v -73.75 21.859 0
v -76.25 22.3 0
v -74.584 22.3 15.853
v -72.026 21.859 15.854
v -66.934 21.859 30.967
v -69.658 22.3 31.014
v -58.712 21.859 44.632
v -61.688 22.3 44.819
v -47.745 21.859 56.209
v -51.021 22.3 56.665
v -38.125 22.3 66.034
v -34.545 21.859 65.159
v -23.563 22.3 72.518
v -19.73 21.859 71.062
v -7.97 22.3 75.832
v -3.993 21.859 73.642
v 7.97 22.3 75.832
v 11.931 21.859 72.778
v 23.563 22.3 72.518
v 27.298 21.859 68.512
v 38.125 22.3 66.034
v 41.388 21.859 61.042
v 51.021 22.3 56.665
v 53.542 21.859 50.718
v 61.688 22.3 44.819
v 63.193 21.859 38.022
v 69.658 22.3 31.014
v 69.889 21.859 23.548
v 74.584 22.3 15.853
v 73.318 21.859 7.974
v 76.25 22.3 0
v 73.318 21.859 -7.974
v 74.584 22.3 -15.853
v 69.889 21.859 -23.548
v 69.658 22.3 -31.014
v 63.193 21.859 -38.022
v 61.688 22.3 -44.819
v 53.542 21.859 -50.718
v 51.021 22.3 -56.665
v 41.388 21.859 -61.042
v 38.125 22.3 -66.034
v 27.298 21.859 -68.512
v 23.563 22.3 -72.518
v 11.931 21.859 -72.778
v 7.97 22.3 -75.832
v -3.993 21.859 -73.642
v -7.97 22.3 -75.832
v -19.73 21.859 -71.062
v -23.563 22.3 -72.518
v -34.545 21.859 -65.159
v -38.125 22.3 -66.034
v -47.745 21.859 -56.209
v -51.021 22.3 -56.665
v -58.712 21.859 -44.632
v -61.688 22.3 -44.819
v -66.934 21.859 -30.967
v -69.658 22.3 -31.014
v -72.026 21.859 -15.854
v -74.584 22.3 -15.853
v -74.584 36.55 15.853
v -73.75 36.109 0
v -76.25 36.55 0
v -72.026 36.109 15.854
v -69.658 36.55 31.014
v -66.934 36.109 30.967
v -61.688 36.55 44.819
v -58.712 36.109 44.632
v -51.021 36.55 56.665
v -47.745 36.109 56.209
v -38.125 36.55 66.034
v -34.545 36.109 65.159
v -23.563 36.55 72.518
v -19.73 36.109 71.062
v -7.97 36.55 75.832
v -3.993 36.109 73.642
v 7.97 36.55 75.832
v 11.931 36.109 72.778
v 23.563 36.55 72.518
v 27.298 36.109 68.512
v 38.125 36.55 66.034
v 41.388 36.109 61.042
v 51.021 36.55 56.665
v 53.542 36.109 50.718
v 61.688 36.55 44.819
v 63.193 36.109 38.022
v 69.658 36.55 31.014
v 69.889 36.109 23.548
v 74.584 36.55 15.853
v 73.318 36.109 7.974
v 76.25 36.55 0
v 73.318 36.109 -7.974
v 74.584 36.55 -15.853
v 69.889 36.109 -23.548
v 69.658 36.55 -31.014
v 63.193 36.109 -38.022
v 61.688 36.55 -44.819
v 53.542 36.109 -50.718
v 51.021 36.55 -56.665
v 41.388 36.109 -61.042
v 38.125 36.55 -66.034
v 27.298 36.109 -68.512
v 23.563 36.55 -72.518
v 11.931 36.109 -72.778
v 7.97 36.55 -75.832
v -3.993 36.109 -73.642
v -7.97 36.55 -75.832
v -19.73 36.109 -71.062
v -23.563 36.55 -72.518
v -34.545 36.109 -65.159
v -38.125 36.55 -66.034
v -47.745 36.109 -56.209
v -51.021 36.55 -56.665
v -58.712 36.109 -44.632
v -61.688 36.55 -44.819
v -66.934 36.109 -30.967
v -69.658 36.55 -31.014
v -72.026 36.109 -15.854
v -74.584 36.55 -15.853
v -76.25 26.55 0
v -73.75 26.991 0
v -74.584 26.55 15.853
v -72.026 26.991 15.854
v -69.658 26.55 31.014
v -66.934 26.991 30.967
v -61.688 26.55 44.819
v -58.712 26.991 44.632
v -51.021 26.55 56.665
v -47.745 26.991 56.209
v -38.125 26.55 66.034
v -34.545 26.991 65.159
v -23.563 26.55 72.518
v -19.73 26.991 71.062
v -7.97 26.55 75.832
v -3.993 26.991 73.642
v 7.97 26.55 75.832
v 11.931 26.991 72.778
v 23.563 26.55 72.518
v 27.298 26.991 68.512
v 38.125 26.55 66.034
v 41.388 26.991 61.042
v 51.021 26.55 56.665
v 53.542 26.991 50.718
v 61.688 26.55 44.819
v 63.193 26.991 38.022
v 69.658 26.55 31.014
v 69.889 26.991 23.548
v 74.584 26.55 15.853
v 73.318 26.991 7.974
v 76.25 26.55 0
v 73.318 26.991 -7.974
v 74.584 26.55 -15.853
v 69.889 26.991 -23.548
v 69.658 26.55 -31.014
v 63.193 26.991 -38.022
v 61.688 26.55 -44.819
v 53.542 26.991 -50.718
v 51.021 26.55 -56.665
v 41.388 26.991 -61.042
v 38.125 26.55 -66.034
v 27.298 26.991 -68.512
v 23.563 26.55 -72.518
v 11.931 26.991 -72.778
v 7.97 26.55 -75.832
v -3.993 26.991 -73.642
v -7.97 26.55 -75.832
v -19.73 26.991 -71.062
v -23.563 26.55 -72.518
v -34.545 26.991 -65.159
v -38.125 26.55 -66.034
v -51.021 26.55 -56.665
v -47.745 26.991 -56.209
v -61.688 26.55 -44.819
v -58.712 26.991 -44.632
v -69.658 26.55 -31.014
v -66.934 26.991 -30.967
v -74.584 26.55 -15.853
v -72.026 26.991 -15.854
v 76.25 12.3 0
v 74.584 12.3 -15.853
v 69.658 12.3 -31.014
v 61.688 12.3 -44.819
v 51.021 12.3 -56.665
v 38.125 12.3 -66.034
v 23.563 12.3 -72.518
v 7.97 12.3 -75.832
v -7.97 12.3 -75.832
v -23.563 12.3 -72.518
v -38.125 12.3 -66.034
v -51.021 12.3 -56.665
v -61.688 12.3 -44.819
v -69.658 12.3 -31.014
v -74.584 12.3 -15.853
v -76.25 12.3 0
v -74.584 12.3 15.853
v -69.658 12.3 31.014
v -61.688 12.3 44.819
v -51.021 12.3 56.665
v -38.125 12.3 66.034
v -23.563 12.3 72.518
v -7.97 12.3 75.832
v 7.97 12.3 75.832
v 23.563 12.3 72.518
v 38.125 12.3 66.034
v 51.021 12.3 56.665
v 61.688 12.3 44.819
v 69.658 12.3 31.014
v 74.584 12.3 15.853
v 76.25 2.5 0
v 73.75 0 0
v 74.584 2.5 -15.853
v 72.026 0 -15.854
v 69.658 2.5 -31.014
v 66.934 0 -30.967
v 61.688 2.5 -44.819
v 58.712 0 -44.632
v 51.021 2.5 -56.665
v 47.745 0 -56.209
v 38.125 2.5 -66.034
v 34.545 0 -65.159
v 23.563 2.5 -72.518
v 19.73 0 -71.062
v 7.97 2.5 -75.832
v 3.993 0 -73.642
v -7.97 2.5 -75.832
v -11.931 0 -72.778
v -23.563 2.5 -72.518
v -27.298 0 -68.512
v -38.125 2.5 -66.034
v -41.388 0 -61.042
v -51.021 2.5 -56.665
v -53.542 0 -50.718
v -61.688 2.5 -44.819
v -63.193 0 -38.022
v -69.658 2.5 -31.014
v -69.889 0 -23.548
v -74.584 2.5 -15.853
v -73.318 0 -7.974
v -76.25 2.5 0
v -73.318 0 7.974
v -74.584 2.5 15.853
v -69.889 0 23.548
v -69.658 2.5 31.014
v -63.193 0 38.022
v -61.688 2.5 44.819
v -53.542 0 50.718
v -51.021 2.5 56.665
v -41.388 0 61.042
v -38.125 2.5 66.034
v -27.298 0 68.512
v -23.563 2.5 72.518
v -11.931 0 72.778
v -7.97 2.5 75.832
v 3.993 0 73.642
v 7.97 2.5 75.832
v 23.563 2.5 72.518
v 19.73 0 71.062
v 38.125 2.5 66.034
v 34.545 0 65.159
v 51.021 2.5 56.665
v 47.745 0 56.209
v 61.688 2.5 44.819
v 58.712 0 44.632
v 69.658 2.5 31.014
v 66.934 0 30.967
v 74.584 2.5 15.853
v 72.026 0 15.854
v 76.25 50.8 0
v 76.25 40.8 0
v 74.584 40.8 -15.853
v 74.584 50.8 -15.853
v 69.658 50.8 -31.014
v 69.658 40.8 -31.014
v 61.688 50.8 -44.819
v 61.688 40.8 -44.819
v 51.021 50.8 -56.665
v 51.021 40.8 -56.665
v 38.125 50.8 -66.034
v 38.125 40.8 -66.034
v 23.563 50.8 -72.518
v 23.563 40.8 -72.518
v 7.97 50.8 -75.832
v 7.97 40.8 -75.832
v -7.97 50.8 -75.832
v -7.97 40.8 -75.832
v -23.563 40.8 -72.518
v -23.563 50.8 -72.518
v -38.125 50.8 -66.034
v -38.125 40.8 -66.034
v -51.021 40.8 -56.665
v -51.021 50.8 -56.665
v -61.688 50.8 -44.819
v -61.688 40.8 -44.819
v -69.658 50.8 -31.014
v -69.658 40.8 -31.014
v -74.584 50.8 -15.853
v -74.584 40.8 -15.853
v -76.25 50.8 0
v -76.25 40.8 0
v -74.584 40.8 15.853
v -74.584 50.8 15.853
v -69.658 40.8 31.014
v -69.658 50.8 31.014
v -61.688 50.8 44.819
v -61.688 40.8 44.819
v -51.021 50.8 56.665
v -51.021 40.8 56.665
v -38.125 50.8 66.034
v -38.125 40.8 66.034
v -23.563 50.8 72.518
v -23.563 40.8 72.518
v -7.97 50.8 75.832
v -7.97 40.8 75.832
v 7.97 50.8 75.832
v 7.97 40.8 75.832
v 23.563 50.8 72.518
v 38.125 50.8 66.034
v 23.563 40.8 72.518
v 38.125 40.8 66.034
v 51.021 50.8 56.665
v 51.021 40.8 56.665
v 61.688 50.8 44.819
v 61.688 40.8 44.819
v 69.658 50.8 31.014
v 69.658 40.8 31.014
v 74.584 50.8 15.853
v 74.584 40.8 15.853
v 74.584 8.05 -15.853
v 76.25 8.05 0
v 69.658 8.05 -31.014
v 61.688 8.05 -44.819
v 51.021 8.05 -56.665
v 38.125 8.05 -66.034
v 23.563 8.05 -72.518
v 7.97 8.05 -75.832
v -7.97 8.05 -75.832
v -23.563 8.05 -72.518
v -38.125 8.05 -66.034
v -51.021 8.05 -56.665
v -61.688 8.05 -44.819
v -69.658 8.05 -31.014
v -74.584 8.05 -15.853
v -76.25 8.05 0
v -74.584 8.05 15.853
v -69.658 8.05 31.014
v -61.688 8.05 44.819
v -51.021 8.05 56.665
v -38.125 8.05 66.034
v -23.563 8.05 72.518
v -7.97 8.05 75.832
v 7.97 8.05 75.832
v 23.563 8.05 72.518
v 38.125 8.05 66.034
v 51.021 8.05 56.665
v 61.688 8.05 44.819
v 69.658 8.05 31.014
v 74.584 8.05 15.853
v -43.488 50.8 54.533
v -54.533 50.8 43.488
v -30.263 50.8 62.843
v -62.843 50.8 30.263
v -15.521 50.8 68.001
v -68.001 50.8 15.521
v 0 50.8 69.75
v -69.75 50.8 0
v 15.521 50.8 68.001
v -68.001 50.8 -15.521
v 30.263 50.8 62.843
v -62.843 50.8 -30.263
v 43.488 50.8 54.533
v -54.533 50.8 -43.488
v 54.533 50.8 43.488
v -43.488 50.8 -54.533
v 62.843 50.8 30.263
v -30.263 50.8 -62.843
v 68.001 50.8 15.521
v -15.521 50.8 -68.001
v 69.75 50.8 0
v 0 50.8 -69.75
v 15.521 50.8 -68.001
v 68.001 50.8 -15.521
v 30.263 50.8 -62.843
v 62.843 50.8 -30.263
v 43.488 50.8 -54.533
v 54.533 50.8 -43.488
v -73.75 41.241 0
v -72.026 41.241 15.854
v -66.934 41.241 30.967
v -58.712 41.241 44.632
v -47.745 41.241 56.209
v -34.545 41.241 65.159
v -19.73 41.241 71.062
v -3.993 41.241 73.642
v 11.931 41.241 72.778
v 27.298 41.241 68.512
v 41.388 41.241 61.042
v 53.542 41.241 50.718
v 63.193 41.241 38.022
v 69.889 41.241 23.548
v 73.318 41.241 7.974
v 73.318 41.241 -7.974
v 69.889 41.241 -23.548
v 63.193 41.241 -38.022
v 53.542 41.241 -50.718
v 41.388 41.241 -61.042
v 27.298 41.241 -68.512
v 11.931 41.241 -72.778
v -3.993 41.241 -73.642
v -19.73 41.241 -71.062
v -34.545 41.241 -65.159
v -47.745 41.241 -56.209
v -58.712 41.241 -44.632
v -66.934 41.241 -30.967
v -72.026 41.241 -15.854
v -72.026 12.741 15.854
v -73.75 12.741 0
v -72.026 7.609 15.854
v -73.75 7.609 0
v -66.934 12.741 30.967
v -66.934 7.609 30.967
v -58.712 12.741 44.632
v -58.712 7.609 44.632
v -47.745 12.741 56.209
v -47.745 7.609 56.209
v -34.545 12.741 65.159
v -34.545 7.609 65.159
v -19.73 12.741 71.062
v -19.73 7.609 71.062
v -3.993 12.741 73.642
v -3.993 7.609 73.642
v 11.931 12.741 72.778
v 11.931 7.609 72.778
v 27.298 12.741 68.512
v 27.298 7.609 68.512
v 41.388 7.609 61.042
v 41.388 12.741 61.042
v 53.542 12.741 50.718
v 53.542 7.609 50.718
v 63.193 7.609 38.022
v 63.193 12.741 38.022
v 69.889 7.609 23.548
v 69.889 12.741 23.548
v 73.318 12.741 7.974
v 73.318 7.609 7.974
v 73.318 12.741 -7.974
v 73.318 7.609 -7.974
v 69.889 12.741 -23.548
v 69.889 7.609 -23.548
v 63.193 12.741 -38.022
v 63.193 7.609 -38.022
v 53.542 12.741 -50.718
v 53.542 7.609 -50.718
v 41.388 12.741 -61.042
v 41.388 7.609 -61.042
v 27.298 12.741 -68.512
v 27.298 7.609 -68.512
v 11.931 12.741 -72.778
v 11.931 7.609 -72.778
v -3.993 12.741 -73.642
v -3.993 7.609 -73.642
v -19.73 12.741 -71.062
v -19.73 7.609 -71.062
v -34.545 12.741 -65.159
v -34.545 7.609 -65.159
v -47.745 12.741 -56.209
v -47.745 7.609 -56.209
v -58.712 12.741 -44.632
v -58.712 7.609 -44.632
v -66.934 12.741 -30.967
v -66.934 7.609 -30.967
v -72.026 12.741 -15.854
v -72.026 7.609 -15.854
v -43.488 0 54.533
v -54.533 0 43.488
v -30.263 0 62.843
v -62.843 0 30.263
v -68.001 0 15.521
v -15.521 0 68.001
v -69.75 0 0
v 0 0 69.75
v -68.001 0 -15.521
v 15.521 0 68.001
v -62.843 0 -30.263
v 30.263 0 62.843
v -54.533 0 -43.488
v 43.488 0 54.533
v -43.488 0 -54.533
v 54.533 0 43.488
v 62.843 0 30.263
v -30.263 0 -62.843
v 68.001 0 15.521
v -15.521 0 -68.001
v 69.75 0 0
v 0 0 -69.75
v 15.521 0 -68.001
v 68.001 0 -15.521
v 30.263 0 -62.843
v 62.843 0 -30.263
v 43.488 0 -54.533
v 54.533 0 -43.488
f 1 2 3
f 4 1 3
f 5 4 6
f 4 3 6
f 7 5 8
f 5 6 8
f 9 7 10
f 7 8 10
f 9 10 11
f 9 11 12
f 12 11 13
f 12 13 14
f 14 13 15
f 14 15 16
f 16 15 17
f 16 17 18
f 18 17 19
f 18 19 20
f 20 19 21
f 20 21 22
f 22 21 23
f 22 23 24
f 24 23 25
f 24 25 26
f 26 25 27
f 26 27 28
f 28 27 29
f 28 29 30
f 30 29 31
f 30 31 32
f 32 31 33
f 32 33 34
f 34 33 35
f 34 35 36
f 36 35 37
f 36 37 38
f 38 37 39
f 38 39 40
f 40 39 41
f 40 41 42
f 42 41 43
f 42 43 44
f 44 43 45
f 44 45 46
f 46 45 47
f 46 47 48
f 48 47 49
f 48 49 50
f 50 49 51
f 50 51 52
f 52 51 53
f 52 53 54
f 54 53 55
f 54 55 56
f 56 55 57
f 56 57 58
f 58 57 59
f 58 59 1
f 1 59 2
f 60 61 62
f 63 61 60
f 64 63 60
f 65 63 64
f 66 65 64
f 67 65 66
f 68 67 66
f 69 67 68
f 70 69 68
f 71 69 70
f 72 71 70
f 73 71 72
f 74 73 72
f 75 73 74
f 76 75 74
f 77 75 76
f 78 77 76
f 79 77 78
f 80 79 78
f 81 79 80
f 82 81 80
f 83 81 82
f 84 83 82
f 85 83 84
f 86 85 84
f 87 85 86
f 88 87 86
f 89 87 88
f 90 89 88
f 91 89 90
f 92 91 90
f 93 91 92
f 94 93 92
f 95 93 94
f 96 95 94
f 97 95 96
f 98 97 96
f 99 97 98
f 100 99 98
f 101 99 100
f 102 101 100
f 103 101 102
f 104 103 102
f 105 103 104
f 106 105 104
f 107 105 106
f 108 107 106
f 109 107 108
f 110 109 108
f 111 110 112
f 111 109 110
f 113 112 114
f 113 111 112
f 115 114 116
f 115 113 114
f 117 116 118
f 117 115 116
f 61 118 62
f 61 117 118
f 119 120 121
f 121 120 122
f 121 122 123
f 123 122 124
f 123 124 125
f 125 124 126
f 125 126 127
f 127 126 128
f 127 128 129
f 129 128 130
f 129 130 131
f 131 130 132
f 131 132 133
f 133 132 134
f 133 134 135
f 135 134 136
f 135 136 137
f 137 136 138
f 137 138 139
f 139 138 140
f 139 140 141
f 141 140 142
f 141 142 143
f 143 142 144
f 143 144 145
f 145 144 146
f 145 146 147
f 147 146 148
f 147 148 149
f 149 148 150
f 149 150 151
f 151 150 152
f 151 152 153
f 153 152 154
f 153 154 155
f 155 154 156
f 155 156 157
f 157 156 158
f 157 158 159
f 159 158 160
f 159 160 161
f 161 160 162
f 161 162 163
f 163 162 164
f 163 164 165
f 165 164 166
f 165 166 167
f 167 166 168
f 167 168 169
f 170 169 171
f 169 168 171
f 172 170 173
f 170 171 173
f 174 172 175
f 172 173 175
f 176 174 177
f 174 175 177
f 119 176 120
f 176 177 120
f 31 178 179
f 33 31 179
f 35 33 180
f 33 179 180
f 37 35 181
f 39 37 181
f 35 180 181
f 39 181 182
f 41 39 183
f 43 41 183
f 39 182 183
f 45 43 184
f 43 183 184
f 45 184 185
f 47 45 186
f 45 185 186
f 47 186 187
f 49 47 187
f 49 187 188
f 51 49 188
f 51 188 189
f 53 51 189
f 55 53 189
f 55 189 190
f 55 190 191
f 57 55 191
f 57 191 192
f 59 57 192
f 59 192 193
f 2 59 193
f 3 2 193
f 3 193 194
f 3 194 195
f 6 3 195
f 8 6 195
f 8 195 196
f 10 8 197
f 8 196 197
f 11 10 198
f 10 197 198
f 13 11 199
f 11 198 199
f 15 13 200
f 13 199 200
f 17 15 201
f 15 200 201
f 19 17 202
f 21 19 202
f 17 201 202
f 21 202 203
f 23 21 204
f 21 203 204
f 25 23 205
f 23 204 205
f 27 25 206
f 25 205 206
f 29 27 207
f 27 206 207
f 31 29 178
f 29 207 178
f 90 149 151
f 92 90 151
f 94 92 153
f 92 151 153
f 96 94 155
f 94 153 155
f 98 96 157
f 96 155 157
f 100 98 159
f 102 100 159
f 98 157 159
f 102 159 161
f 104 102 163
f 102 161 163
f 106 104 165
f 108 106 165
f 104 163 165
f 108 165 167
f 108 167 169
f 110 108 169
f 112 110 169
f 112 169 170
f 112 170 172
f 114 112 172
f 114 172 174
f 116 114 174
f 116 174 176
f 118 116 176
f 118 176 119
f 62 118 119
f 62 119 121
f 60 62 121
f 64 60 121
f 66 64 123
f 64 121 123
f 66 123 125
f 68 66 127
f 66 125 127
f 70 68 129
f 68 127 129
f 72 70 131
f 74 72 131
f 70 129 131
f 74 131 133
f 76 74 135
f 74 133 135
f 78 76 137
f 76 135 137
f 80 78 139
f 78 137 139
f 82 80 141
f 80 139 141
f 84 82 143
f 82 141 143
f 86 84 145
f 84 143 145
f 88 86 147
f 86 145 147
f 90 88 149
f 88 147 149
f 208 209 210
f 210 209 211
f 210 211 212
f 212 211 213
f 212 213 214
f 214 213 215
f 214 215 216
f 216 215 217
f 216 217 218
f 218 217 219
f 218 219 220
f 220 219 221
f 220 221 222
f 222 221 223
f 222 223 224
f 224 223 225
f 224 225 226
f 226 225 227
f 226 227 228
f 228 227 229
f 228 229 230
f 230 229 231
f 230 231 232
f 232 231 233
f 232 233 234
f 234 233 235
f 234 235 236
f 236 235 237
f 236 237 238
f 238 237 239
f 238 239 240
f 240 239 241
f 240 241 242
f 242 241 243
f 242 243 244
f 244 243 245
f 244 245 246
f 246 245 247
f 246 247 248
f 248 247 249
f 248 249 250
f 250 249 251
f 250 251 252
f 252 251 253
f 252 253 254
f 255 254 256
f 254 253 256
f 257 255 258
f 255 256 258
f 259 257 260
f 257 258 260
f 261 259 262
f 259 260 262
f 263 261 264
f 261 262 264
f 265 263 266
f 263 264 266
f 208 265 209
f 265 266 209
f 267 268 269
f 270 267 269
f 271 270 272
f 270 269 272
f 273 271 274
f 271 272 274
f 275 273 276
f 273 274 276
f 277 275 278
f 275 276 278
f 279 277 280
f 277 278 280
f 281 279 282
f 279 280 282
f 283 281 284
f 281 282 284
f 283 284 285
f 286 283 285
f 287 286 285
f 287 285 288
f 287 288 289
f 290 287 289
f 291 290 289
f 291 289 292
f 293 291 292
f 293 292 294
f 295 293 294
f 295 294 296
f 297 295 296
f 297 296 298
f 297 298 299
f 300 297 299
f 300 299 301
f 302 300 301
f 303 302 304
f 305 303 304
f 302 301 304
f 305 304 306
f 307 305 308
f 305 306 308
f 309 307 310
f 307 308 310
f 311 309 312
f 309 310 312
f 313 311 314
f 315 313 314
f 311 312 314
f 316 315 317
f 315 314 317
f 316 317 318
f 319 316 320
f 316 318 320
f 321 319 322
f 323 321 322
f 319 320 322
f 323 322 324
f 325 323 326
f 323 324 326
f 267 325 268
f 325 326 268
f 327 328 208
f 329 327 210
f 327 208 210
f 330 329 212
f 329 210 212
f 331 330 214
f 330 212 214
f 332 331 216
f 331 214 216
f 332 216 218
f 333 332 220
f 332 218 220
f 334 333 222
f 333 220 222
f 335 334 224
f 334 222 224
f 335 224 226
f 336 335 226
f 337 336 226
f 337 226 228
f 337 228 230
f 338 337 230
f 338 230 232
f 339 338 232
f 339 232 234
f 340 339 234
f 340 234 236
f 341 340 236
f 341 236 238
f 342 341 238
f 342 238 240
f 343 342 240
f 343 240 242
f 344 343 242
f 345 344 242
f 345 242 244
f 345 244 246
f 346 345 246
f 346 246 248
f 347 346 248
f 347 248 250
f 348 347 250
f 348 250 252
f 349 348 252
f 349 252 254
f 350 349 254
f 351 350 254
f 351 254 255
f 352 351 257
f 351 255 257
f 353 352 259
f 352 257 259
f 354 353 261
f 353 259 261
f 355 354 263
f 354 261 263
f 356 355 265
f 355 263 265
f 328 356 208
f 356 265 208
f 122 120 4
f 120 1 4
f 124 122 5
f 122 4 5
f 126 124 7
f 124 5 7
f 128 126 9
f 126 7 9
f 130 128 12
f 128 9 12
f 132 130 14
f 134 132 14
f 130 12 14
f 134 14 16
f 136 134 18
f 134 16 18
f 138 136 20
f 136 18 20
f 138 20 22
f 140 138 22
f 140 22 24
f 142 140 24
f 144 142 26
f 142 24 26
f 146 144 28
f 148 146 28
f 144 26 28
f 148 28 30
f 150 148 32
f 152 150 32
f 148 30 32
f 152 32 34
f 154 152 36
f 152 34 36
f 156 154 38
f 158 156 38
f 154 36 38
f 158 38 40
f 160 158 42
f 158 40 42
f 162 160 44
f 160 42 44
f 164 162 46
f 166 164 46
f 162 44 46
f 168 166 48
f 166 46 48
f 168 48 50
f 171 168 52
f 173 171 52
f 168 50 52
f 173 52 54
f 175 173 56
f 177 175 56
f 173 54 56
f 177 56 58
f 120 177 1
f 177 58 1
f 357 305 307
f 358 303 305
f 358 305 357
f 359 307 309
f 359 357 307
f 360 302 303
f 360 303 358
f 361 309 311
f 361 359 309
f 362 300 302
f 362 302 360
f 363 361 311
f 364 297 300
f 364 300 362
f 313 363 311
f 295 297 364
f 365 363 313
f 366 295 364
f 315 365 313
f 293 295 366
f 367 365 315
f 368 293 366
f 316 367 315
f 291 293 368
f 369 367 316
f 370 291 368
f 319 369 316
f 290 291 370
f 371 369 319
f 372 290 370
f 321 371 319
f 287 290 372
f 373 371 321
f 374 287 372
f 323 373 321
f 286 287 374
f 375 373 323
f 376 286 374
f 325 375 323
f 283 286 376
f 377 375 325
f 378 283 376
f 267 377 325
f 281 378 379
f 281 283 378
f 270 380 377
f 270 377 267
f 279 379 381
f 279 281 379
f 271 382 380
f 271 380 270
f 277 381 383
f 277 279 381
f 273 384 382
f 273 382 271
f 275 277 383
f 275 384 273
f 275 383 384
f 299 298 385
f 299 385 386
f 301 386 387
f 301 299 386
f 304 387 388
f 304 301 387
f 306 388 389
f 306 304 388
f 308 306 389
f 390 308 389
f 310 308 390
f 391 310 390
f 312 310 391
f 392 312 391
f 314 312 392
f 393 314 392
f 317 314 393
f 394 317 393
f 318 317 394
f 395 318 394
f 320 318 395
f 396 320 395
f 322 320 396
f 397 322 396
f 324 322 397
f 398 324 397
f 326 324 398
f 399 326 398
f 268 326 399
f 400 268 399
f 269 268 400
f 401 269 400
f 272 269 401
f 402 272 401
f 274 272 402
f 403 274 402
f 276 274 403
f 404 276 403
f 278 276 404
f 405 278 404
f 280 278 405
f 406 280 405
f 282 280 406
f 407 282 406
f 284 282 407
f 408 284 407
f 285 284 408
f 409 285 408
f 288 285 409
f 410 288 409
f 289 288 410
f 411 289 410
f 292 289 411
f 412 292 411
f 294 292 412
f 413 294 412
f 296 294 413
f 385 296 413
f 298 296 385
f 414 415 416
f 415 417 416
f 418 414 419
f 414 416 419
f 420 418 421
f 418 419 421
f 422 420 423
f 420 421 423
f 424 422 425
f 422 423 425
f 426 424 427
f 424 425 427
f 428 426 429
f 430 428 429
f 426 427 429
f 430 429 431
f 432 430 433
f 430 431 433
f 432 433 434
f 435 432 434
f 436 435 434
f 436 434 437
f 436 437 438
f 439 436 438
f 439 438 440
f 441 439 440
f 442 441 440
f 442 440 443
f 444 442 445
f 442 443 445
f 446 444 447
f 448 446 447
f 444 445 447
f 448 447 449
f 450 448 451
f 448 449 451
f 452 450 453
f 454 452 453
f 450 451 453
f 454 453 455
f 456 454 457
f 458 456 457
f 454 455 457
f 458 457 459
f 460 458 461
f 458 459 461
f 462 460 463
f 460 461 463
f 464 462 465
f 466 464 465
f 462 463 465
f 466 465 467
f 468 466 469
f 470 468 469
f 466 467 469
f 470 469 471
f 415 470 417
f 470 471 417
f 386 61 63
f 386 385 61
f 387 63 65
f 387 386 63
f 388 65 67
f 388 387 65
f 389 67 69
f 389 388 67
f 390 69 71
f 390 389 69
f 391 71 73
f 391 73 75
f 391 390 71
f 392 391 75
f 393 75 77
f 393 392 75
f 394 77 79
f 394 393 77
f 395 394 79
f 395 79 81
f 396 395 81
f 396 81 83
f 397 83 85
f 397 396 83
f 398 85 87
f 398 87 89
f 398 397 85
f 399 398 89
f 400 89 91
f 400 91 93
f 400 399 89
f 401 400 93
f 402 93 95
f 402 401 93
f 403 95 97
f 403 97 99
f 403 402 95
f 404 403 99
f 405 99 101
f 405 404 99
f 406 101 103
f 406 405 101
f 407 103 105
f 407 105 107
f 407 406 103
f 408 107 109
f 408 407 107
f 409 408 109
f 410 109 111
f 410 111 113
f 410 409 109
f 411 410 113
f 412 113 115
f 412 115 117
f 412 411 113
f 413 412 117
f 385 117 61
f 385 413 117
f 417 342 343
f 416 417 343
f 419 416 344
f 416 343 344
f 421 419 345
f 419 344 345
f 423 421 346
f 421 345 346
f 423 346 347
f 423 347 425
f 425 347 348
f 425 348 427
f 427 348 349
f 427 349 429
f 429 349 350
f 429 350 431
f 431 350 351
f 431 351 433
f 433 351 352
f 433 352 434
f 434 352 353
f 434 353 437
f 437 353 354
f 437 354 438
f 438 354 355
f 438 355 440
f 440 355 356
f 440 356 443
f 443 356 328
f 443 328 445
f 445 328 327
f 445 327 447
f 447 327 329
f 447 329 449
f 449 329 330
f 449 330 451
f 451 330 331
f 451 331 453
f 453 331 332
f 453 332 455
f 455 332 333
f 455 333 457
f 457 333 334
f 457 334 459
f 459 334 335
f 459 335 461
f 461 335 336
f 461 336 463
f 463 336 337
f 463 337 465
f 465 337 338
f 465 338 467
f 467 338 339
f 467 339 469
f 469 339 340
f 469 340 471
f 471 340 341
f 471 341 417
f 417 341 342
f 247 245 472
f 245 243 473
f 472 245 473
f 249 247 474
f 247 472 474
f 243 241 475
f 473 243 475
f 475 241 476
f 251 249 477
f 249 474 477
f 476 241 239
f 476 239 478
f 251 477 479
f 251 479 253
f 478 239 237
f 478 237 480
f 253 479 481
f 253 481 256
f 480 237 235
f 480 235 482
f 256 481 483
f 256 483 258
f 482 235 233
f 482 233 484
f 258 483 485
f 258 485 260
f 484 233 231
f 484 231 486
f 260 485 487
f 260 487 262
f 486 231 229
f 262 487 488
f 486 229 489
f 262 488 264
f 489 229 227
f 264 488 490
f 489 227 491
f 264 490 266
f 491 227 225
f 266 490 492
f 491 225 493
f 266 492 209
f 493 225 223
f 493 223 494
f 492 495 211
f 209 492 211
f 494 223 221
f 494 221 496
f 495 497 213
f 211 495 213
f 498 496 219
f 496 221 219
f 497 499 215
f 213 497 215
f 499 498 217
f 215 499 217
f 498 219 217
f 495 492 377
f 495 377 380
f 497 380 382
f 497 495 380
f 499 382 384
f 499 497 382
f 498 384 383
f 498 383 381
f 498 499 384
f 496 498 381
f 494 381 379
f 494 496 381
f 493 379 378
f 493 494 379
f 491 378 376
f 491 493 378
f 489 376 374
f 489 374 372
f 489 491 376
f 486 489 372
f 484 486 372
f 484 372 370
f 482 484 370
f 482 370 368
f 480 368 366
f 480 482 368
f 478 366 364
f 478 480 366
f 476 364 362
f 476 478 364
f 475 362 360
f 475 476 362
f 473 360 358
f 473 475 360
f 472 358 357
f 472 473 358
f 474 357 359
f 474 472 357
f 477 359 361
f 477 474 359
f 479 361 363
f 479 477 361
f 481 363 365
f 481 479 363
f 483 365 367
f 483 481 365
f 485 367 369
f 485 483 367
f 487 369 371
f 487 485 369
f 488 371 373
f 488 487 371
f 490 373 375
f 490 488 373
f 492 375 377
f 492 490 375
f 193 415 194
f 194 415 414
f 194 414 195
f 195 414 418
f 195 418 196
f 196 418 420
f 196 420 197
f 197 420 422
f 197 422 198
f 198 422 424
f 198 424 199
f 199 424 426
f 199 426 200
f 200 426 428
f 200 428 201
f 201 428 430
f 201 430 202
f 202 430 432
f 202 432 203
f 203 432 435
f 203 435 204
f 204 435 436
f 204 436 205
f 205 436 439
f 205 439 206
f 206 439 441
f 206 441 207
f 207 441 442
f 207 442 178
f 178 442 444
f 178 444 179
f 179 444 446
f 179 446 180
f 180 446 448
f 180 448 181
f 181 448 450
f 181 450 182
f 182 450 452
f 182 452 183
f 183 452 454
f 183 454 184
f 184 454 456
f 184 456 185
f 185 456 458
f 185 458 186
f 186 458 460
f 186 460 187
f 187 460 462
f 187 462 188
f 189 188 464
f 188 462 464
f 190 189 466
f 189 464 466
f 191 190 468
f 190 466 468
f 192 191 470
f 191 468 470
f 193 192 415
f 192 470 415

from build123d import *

# Parameters (mm, degrees)
SKETCH1_R           = 76.25
SKETCH1_R_2         = 69.75
BOSS_EXTRUDE1_DEPTH = 50.8
CHAMFER1_SIZE       = 2.5


with BuildPart() as part:
    # Sketch1 → Boss-Extrude1 (new body)
    with BuildSketch(Plane(origin=(0, 0, 0), x_dir=(1, 0, 0), z_dir=(0, 1, 0))):
        Circle(SKETCH1_R)
        Circle(SKETCH1_R_2, mode=Mode.SUBTRACT)
    extrude(amount=BOSS_EXTRUDE1_DEPTH)

    # Sketch2 → Cut-Revolve1 (revolve, cut)
    with BuildSketch(Plane.XY):
        Polygon((-76.25, 40.8), (-76.25, 36.55), (-73.75, 36.109182548), (-73.75, 41.240817452), align=None)
        Polygon((-73.75, 26.990817452), (-73.75, 21.859182548), (-76.25, 22.3), (-76.25, 26.55), align=None)
        Polygon((-73.75, 12.740817452), (-73.75, 7.609182548), (-76.25, 8.05), (-76.25, 12.3), align=None)
    revolve(axis=Axis((0, 0, 0), (0, 1, 0)), mode=Mode.SUBTRACT)

    # Chamfer1
    chamfer1_edges = [part.edges().sort_by_distance(p)[0] for p in [
        (-76.25, 0, 0),
    ]]
    chamfer(chamfer1_edges, length=CHAMFER1_SIZE)


solid = part.part
